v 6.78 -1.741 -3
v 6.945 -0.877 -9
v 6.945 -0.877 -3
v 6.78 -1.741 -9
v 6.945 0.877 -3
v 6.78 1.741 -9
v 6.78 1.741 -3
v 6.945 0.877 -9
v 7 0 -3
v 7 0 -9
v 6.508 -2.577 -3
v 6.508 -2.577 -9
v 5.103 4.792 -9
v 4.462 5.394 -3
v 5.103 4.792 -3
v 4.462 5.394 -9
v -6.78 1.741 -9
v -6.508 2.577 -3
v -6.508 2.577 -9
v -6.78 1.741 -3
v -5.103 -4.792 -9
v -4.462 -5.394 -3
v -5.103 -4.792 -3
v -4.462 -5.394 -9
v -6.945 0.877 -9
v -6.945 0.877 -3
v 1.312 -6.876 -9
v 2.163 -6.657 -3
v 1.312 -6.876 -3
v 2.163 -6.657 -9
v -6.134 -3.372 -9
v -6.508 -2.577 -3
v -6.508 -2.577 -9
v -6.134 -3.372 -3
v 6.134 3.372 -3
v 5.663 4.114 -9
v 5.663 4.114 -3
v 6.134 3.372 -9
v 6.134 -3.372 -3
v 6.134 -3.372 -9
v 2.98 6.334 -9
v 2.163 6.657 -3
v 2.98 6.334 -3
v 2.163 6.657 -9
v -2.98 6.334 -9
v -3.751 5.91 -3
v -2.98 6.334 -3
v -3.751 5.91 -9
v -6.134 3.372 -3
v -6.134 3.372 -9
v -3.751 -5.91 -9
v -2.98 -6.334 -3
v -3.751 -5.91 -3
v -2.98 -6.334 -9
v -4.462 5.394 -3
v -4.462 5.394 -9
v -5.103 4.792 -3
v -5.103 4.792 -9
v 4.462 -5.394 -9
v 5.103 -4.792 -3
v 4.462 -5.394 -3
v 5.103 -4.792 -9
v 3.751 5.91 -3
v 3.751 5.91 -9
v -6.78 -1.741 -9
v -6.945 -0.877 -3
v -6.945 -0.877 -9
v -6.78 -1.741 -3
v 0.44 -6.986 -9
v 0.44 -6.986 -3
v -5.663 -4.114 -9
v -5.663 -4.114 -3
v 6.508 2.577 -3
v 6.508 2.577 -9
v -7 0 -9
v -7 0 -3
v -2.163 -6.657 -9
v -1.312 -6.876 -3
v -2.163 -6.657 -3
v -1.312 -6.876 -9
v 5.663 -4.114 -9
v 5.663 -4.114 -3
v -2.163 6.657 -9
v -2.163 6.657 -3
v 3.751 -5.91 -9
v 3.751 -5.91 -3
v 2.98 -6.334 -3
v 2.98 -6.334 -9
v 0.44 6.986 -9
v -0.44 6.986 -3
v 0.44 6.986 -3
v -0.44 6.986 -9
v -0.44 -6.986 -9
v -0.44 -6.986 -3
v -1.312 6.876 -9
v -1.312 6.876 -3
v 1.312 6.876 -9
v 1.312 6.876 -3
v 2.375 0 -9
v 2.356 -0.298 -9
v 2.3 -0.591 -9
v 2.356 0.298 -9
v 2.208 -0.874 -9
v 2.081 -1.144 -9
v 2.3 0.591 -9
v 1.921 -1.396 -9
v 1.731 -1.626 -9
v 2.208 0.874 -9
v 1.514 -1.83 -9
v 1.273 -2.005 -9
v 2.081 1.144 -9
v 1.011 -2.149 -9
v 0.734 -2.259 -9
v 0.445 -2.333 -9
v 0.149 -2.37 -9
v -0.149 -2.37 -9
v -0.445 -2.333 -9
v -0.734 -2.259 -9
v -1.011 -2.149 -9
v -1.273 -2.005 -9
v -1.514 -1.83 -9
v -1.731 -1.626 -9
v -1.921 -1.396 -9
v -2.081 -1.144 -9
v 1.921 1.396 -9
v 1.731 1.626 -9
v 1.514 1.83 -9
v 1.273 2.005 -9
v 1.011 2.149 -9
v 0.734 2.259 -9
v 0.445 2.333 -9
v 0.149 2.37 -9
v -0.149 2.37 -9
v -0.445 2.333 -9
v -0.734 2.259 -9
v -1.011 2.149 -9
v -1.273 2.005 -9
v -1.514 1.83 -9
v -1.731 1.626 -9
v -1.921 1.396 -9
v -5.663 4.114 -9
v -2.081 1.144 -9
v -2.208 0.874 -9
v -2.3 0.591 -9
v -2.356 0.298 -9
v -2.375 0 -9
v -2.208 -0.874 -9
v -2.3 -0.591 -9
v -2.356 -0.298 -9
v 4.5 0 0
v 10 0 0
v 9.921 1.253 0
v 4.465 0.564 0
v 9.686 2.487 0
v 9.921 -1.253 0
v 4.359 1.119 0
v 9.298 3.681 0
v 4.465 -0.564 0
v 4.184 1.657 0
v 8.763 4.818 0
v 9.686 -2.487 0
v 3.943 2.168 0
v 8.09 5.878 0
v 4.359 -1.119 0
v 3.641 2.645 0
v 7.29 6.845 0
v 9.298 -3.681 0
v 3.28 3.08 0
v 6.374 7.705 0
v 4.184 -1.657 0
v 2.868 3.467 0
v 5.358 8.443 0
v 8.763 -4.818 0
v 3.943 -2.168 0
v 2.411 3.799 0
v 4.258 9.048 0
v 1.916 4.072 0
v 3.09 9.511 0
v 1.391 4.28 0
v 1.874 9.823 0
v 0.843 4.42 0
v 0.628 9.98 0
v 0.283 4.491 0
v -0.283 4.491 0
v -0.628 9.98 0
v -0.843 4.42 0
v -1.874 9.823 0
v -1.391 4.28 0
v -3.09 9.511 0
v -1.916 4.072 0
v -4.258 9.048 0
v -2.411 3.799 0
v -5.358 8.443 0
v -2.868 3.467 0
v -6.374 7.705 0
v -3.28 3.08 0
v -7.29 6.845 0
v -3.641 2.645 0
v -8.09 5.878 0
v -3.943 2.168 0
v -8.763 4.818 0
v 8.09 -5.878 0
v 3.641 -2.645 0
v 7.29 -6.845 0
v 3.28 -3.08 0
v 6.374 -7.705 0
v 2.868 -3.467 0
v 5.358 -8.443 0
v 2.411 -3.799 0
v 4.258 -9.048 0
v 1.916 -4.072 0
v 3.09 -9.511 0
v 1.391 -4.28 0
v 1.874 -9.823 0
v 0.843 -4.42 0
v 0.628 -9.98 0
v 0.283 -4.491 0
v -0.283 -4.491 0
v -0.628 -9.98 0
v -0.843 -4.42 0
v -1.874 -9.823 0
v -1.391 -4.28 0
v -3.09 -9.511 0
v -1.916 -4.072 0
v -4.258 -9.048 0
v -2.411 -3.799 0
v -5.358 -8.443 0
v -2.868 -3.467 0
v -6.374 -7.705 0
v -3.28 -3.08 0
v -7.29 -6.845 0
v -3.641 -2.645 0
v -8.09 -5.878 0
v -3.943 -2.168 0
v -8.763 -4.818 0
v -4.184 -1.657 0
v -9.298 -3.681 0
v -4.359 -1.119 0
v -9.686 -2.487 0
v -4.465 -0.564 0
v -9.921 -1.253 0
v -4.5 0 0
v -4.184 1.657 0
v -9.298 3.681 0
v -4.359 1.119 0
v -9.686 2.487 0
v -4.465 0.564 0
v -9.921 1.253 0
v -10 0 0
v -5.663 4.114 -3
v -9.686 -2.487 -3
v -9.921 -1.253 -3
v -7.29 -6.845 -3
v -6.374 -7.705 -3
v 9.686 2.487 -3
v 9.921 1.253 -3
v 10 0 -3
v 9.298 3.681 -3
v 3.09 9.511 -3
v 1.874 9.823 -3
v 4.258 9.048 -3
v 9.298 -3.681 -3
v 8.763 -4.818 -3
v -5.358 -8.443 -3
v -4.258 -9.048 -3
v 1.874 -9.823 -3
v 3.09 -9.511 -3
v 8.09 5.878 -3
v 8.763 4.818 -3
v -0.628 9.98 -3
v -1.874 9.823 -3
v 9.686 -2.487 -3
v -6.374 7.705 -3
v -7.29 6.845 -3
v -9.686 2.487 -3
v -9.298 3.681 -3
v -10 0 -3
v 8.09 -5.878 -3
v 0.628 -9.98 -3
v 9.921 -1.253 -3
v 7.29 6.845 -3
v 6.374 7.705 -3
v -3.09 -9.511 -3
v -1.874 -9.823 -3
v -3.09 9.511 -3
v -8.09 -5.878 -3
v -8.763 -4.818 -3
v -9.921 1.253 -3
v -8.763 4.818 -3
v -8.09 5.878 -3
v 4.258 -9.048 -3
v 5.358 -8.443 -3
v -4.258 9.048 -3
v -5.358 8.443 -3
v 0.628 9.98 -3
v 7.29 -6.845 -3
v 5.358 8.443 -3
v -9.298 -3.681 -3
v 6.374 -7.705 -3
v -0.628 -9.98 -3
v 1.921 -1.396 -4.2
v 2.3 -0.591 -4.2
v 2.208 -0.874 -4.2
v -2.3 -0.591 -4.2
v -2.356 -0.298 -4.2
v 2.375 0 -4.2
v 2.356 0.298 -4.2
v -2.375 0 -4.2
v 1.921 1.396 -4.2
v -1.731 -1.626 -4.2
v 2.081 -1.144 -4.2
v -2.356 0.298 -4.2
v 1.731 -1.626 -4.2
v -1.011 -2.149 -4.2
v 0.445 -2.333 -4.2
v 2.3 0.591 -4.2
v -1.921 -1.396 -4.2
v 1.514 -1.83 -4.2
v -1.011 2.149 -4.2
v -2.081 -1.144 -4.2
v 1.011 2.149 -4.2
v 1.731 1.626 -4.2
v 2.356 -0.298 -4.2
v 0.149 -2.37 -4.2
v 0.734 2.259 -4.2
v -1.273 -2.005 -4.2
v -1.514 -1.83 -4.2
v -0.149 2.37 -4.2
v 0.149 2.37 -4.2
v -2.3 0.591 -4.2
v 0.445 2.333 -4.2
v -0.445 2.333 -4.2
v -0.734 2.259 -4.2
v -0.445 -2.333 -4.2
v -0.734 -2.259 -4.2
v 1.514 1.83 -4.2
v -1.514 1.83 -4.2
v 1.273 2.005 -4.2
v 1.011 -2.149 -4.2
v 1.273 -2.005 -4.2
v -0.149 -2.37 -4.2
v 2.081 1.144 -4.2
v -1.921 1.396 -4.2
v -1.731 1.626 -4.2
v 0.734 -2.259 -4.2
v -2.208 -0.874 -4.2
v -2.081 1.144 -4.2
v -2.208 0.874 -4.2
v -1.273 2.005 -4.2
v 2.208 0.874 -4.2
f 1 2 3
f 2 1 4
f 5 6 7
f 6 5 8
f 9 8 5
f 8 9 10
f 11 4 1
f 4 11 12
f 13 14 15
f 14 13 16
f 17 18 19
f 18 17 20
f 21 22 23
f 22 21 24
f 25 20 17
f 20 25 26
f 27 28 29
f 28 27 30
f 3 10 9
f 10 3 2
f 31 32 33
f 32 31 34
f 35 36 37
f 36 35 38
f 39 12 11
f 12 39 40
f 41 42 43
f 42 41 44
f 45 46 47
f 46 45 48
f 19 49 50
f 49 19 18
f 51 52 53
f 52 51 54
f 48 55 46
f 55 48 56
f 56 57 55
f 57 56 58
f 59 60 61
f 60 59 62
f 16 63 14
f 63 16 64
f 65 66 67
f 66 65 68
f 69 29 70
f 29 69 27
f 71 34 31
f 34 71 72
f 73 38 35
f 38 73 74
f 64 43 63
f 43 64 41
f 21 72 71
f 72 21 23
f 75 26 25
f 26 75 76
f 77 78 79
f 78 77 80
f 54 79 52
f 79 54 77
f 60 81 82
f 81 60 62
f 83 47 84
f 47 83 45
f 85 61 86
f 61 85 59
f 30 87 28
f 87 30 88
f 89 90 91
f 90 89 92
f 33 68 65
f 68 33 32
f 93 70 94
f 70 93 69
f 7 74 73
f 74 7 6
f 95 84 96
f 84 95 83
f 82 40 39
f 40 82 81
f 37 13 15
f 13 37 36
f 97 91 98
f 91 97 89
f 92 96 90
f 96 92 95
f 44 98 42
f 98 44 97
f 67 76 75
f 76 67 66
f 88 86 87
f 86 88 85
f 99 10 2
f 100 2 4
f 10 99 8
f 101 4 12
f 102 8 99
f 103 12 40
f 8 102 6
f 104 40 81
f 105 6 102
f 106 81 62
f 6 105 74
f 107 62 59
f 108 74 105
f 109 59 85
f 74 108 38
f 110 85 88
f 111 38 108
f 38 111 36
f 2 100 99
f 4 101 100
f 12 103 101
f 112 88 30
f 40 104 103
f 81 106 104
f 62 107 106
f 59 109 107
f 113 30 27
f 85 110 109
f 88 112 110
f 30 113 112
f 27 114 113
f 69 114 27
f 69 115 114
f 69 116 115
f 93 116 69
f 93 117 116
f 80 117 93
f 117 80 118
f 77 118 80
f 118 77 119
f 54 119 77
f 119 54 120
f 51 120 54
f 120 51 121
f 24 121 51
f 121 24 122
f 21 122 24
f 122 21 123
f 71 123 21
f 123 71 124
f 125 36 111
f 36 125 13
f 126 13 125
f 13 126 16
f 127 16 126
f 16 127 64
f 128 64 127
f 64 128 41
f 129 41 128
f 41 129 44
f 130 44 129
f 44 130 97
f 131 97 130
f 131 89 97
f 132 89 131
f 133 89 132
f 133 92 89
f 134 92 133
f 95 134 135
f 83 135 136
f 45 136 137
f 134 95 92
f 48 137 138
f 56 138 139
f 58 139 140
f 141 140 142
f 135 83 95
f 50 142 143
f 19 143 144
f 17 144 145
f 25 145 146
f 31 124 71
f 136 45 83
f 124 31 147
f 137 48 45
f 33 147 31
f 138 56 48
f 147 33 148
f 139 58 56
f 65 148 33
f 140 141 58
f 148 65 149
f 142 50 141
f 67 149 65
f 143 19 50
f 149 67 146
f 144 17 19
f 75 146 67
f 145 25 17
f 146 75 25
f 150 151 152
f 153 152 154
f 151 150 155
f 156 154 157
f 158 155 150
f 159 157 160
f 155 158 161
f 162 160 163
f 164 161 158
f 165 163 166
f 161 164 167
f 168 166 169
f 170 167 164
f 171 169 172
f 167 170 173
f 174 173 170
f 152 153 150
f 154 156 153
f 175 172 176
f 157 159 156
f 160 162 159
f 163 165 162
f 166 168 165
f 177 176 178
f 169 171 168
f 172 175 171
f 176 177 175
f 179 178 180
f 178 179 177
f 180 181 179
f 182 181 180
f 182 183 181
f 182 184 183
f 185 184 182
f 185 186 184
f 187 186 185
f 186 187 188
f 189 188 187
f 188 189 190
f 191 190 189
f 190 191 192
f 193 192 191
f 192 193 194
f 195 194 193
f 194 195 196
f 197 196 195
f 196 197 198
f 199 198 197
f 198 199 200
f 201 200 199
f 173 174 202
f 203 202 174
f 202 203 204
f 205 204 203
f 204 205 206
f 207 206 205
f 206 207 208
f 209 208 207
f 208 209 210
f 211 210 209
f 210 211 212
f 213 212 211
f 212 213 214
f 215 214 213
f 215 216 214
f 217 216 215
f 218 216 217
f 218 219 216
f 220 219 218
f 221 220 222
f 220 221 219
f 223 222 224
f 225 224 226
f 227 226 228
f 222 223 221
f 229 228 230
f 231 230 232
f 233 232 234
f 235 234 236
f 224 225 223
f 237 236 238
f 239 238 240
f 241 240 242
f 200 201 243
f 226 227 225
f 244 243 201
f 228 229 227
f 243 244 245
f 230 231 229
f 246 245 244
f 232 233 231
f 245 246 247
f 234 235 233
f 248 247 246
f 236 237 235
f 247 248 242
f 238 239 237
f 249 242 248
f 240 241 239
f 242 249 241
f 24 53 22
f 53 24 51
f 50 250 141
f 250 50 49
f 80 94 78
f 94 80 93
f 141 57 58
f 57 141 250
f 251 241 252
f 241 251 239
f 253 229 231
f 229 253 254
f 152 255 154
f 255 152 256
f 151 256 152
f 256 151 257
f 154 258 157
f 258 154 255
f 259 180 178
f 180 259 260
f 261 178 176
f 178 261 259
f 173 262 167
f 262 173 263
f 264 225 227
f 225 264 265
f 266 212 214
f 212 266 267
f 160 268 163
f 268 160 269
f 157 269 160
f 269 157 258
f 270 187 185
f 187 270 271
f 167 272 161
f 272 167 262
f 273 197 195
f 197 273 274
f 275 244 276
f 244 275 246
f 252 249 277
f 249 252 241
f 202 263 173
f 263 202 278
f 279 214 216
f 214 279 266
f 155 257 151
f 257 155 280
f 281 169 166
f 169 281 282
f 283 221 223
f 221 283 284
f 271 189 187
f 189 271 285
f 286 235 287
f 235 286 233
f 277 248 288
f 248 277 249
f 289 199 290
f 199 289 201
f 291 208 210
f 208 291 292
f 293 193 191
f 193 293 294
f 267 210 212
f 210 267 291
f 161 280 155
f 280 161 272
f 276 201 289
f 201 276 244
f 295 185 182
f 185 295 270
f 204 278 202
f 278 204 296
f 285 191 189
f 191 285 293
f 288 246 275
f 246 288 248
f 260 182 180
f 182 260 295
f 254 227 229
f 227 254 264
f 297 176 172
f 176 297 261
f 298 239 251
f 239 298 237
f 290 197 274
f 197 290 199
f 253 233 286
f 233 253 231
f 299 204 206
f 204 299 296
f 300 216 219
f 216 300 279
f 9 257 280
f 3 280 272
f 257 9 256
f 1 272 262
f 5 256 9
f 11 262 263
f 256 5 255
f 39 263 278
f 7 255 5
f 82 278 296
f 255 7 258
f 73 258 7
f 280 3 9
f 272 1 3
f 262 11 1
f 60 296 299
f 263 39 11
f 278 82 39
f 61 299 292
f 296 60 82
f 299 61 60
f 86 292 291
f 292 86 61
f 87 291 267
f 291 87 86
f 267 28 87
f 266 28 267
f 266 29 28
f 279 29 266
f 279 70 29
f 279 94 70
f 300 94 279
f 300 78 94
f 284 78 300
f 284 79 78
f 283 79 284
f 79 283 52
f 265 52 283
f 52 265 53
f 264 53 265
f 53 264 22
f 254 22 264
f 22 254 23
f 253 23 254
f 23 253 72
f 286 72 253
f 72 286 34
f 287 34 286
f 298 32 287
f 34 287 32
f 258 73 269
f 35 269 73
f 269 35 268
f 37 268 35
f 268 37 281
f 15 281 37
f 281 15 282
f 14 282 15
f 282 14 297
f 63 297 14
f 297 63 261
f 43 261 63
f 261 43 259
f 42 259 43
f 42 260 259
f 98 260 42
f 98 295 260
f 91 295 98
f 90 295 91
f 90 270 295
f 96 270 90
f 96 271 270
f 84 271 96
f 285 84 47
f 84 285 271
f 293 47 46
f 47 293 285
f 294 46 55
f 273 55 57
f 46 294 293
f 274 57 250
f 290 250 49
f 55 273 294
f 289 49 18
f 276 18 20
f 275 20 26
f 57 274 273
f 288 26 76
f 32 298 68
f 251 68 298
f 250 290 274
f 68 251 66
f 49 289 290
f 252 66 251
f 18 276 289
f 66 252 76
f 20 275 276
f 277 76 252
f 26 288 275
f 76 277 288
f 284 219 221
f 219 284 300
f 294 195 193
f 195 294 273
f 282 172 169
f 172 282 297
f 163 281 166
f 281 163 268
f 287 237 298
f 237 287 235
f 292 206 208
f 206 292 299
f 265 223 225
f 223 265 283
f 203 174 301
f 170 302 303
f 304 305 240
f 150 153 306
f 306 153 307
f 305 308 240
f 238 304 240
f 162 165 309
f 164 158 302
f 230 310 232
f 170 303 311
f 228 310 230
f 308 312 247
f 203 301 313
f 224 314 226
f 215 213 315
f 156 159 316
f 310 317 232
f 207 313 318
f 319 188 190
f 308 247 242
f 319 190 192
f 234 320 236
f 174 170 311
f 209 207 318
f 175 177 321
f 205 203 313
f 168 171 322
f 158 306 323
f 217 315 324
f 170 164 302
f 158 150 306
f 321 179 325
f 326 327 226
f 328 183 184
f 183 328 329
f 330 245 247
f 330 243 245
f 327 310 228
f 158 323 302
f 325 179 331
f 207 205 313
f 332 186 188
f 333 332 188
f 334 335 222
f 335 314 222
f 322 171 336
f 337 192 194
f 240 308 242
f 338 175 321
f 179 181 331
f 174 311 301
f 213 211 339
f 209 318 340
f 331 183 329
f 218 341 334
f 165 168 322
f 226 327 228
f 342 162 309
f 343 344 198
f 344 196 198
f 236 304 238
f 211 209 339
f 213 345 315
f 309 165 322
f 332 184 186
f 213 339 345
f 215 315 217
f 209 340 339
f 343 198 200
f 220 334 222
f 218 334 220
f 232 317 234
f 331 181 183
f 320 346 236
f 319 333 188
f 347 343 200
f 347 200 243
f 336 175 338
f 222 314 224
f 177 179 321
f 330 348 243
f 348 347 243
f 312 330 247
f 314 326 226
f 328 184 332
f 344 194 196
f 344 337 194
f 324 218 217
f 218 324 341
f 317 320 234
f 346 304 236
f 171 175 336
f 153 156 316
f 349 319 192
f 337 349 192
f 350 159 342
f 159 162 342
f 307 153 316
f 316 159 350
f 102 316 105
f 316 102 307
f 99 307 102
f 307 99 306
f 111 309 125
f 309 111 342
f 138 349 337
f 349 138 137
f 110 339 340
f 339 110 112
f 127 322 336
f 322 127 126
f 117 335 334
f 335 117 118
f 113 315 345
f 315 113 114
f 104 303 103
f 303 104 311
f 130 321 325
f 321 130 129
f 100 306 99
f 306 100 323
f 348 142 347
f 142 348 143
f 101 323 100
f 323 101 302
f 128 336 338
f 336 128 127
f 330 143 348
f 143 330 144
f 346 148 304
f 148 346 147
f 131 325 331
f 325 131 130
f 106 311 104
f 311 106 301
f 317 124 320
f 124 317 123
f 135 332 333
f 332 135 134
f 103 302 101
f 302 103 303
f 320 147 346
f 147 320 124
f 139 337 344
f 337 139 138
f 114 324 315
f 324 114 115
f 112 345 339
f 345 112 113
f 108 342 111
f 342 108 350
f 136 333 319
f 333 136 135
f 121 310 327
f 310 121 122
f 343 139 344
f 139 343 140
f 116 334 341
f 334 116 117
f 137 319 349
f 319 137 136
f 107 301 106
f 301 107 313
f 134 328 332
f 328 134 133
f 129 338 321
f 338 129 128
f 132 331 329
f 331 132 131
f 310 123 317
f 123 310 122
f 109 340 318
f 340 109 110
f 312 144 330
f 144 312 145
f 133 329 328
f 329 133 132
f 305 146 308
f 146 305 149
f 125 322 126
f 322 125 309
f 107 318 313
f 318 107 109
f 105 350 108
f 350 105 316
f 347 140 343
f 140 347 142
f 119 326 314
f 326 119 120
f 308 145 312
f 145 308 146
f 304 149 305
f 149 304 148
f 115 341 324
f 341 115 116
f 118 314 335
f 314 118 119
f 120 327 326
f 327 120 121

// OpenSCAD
$fn = 50;


difference() {
	union() {
		translate(v = [0, 0, -9.0000000000]) {
			cylinder(h = 9, r = 7.0000000000);
		}
		translate(v = [0, 0, -3.0000000000]) {
			cylinder(h = 3, r = 10.0000000000);
		}
	}
	union() {
		translate(v = [0, 0, 0]) {
			rotate(a = [0, 0, 0]) {
				difference() {
					union() {
						#translate(v = [0, 0, -9.0000000000]) {
							cylinder(h = 9, r = 2.2500000000);
						}
						#translate(v = [0, 0, -4.2000000000]) {
							cylinder(h = 4.2000000000, r = 7.0000000000, r1 = 2.3750000000, r2 = 4.5000000000);
						}
						#translate(v = [0, 0, -9.0000000000]) {
							cylinder(h = 9, r = 2.3750000000);
						}
						#translate(v = [0, 0, -9.0000000000]) {
							cylinder(h = 9, r = 2.2500000000);
						}
					}
					union();
				}
			}
		}
	}
}
